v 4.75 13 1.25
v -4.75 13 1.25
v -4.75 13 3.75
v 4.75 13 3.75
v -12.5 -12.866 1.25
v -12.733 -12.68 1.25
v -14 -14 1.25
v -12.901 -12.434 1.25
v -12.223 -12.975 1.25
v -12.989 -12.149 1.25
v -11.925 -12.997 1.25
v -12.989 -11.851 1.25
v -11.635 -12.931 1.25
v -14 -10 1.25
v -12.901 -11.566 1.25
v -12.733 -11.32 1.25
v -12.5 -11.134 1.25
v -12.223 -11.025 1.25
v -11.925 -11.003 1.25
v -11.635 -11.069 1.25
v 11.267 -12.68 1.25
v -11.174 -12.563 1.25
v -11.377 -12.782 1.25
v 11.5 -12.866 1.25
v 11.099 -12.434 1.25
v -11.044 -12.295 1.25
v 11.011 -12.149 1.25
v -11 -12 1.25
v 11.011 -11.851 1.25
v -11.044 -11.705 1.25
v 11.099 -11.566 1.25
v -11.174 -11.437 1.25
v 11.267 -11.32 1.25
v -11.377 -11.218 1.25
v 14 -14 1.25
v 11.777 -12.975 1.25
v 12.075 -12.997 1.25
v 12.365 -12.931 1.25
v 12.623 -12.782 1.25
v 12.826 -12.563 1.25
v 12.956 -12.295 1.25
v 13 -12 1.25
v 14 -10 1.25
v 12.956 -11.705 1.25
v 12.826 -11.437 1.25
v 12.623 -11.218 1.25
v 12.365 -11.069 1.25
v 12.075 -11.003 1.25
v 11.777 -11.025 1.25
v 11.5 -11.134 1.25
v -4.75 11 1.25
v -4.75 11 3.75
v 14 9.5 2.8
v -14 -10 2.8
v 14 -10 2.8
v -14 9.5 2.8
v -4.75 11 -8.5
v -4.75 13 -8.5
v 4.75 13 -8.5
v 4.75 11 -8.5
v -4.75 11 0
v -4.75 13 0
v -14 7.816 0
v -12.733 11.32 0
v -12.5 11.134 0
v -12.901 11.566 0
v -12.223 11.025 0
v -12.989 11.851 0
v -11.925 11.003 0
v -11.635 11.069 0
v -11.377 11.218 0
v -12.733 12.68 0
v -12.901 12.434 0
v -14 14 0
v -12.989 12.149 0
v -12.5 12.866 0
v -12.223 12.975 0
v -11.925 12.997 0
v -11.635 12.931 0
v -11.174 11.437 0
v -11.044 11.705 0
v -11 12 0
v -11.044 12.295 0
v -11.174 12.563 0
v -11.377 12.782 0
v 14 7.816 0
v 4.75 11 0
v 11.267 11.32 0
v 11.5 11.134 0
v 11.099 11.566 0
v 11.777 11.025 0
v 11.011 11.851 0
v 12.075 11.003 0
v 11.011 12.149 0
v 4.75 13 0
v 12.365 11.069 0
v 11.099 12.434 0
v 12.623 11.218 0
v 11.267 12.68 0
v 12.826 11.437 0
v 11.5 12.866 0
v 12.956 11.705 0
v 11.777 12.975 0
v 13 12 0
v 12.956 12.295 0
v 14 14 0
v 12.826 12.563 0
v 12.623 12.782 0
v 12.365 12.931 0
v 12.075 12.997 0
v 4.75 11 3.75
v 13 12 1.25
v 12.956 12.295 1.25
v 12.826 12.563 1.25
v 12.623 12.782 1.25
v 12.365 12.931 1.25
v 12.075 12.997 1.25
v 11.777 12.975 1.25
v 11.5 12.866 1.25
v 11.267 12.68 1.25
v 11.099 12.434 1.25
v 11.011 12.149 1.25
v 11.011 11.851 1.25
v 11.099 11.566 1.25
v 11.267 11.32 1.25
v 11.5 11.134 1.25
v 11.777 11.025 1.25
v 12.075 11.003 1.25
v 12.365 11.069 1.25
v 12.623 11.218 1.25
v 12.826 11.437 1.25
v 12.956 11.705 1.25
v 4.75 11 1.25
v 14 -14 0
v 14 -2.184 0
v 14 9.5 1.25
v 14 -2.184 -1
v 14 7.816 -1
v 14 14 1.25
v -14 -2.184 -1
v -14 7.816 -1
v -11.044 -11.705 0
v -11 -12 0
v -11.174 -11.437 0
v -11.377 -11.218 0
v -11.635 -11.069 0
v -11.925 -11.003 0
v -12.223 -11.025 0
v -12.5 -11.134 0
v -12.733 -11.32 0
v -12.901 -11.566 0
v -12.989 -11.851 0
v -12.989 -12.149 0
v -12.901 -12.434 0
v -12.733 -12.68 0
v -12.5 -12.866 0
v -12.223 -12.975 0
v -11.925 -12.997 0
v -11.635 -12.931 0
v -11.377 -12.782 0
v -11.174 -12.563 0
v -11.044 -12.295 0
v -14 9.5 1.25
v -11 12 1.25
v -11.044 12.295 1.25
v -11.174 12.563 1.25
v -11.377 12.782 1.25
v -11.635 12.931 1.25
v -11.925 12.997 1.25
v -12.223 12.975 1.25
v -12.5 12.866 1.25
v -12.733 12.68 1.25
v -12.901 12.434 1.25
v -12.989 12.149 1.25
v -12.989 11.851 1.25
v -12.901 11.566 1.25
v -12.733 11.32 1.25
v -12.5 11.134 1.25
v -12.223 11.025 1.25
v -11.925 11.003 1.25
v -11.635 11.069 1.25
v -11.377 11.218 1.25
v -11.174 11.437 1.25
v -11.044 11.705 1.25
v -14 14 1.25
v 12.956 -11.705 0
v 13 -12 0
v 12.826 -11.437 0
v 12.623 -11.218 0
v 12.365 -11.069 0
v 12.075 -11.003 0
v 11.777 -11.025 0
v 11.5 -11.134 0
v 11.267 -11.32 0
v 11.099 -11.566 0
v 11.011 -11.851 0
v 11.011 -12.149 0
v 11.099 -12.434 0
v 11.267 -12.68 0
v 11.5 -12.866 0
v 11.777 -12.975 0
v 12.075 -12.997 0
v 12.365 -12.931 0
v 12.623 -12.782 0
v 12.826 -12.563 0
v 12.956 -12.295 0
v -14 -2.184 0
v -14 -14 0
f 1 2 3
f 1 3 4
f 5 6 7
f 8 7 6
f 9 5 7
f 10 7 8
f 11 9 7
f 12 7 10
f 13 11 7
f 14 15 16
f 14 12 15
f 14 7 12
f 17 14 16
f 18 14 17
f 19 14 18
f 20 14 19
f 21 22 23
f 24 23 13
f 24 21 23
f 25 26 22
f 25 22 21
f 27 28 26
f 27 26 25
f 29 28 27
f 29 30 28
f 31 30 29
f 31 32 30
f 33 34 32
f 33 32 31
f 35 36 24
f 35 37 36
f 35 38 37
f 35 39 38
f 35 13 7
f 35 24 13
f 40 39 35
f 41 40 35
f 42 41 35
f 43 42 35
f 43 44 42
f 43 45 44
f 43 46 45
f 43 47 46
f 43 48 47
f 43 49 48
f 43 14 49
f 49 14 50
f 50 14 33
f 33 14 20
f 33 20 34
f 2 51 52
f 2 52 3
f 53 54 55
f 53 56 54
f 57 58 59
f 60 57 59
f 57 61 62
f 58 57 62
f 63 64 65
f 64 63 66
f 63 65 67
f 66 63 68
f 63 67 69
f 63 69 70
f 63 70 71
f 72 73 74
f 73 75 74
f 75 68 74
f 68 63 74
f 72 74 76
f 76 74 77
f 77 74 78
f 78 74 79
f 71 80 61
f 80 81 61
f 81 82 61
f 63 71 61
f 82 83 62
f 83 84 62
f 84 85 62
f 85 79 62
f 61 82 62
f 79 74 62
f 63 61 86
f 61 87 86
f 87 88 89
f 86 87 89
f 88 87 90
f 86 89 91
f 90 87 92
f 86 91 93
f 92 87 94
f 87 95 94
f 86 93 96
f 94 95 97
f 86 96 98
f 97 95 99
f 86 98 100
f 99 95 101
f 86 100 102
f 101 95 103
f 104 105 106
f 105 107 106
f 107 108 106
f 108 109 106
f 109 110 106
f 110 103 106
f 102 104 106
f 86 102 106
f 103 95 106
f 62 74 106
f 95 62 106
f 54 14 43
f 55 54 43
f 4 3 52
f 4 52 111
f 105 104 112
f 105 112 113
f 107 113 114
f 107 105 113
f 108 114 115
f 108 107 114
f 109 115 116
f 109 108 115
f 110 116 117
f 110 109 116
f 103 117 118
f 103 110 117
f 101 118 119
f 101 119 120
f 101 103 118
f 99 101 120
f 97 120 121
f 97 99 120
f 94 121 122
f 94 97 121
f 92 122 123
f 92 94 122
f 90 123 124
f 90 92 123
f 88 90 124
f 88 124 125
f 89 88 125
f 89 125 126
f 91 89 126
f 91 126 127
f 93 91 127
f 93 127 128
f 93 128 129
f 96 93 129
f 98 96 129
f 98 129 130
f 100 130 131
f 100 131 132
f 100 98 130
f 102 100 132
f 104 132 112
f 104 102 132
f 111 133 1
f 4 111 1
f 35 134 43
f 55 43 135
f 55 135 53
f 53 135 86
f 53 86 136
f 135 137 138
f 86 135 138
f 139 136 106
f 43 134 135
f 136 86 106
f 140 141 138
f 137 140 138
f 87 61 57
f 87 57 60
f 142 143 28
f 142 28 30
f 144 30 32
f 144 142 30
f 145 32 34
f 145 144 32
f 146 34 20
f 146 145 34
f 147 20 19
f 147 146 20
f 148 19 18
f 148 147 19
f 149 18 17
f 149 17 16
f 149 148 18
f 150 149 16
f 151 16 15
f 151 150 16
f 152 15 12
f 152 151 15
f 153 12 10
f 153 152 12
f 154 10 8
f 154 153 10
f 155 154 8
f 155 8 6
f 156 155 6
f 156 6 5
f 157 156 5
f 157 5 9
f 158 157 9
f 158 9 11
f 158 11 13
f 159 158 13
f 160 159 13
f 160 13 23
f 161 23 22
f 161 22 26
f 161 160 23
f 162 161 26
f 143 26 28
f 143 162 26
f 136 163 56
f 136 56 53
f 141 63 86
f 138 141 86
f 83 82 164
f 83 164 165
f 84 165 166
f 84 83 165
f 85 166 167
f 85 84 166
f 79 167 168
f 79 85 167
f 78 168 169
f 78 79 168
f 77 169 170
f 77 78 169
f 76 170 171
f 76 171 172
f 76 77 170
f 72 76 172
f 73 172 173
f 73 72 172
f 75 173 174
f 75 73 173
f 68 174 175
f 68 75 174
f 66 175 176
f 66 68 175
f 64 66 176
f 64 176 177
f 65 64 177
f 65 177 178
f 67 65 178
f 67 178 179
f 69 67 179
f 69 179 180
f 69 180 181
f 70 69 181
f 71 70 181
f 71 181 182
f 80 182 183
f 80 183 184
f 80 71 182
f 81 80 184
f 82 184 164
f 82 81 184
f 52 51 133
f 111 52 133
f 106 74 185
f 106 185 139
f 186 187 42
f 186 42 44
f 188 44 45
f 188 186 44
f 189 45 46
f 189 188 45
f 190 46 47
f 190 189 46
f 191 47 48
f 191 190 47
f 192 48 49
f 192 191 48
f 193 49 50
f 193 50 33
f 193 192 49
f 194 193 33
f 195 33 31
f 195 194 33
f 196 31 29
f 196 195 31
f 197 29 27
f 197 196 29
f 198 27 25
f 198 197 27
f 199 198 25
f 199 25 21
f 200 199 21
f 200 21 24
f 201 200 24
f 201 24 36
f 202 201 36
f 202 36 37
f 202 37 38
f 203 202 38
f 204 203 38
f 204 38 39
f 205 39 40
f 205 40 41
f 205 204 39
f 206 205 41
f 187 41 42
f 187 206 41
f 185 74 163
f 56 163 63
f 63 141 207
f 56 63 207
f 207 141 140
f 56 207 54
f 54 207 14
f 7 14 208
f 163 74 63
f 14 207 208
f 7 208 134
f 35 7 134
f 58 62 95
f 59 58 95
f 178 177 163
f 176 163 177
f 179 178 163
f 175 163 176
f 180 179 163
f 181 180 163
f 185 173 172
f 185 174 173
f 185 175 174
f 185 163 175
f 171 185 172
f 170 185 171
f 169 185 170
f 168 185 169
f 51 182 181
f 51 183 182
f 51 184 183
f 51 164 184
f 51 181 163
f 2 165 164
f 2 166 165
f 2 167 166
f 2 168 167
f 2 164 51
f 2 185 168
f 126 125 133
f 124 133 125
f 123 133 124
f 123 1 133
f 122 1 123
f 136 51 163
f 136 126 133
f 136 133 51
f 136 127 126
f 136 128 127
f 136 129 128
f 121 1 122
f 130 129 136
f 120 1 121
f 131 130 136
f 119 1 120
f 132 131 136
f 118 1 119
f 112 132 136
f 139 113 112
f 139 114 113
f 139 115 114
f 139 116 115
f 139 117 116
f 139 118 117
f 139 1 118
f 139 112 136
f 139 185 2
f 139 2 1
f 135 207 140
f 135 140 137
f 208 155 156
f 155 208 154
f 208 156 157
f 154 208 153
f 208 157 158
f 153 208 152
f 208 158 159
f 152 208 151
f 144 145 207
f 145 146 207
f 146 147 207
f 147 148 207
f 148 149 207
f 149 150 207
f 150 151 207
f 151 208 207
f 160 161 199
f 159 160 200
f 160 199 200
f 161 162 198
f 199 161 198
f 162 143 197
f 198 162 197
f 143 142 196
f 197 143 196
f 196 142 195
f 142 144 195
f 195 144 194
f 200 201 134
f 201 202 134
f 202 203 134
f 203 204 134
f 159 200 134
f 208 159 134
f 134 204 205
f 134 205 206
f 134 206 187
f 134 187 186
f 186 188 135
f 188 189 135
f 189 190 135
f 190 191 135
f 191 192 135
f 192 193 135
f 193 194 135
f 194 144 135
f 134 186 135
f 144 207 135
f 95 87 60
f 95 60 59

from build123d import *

# Parameters (mm, degrees)
F0_W          = 28
F0_H          = 4.5
F0_R          = 1
F0_W_2        = 9.5
F0_H_2        = 2
F0_H_3        = 1.684464
F0_H_4        = 4
F0_H_5        = 10
F0_H_6        = 7.815536
F1_DEPTH      = 1.25
F2_DEPTH      = 3.75
F2_DEPTH_BACK = 8.5
F3_DEPTH      = 1
F4_DEPTH      = 2.8


with BuildPart() as f1:
    # F0 (on Top) → F1 (new body)
    with BuildSketch(Plane.XY):
        with Locations((0, 11.75)):
            Rectangle(F0_W, F0_H)
        with Locations((-12, 12)):
            Circle(F0_R, mode=Mode.SUBTRACT)
        with Locations((0, 12)):
            Rectangle(F0_W_2, F0_H_2, mode=Mode.SUBTRACT)
        with Locations((12, 12)):
            Circle(F0_R, mode=Mode.SUBTRACT)
        with Locations((0, 12)):
            Rectangle(F0_W_2, F0_H_2)
        with Locations((0, 8.657768)):
            Rectangle(F0_W, F0_H_3)
        with Locations((0, -12)):
            Rectangle(F0_W, F0_H_4)
        with Locations((-12, -12)):
            Circle(F0_R, mode=Mode.SUBTRACT)
        with Locations((12, -12)):
            Circle(F0_R, mode=Mode.SUBTRACT)
        with Locations((0, 2.815536)):
            Rectangle(F0_W, F0_H_5)
        with Locations((0, -6.092232)):
            Rectangle(F0_W, F0_H_6)
    extrude(amount=F1_DEPTH)

    # F0 (on Top) → F2 (join, two sides)
    with BuildSketch(Plane.XY) as f2_sk:
        with Locations((0, 12)):
            Rectangle(F0_W_2, F0_H_2)
    extrude(amount=F2_DEPTH)
    extrude(f2_sk.sketch, amount=-F2_DEPTH_BACK)

    # F0 (on Top) → F3 (join)
    with BuildSketch(Plane.XY):
        with Locations((0, 2.815536)):
            Rectangle(F0_W, F0_H_5)
    extrude(amount=-F3_DEPTH)

    # F0 (on Top) → F4 (join)
    with BuildSketch(Plane.XY):
        with Locations((0, 2.815536)):
            Rectangle(F0_W, F0_H_5)
        with Locations((0, -6.092232)):
            Rectangle(F0_W, F0_H_6)
        with Locations((0, 8.657768)):
            Rectangle(F0_W, F0_H_3)
    extrude(amount=F4_DEPTH)


solid = f1.part
